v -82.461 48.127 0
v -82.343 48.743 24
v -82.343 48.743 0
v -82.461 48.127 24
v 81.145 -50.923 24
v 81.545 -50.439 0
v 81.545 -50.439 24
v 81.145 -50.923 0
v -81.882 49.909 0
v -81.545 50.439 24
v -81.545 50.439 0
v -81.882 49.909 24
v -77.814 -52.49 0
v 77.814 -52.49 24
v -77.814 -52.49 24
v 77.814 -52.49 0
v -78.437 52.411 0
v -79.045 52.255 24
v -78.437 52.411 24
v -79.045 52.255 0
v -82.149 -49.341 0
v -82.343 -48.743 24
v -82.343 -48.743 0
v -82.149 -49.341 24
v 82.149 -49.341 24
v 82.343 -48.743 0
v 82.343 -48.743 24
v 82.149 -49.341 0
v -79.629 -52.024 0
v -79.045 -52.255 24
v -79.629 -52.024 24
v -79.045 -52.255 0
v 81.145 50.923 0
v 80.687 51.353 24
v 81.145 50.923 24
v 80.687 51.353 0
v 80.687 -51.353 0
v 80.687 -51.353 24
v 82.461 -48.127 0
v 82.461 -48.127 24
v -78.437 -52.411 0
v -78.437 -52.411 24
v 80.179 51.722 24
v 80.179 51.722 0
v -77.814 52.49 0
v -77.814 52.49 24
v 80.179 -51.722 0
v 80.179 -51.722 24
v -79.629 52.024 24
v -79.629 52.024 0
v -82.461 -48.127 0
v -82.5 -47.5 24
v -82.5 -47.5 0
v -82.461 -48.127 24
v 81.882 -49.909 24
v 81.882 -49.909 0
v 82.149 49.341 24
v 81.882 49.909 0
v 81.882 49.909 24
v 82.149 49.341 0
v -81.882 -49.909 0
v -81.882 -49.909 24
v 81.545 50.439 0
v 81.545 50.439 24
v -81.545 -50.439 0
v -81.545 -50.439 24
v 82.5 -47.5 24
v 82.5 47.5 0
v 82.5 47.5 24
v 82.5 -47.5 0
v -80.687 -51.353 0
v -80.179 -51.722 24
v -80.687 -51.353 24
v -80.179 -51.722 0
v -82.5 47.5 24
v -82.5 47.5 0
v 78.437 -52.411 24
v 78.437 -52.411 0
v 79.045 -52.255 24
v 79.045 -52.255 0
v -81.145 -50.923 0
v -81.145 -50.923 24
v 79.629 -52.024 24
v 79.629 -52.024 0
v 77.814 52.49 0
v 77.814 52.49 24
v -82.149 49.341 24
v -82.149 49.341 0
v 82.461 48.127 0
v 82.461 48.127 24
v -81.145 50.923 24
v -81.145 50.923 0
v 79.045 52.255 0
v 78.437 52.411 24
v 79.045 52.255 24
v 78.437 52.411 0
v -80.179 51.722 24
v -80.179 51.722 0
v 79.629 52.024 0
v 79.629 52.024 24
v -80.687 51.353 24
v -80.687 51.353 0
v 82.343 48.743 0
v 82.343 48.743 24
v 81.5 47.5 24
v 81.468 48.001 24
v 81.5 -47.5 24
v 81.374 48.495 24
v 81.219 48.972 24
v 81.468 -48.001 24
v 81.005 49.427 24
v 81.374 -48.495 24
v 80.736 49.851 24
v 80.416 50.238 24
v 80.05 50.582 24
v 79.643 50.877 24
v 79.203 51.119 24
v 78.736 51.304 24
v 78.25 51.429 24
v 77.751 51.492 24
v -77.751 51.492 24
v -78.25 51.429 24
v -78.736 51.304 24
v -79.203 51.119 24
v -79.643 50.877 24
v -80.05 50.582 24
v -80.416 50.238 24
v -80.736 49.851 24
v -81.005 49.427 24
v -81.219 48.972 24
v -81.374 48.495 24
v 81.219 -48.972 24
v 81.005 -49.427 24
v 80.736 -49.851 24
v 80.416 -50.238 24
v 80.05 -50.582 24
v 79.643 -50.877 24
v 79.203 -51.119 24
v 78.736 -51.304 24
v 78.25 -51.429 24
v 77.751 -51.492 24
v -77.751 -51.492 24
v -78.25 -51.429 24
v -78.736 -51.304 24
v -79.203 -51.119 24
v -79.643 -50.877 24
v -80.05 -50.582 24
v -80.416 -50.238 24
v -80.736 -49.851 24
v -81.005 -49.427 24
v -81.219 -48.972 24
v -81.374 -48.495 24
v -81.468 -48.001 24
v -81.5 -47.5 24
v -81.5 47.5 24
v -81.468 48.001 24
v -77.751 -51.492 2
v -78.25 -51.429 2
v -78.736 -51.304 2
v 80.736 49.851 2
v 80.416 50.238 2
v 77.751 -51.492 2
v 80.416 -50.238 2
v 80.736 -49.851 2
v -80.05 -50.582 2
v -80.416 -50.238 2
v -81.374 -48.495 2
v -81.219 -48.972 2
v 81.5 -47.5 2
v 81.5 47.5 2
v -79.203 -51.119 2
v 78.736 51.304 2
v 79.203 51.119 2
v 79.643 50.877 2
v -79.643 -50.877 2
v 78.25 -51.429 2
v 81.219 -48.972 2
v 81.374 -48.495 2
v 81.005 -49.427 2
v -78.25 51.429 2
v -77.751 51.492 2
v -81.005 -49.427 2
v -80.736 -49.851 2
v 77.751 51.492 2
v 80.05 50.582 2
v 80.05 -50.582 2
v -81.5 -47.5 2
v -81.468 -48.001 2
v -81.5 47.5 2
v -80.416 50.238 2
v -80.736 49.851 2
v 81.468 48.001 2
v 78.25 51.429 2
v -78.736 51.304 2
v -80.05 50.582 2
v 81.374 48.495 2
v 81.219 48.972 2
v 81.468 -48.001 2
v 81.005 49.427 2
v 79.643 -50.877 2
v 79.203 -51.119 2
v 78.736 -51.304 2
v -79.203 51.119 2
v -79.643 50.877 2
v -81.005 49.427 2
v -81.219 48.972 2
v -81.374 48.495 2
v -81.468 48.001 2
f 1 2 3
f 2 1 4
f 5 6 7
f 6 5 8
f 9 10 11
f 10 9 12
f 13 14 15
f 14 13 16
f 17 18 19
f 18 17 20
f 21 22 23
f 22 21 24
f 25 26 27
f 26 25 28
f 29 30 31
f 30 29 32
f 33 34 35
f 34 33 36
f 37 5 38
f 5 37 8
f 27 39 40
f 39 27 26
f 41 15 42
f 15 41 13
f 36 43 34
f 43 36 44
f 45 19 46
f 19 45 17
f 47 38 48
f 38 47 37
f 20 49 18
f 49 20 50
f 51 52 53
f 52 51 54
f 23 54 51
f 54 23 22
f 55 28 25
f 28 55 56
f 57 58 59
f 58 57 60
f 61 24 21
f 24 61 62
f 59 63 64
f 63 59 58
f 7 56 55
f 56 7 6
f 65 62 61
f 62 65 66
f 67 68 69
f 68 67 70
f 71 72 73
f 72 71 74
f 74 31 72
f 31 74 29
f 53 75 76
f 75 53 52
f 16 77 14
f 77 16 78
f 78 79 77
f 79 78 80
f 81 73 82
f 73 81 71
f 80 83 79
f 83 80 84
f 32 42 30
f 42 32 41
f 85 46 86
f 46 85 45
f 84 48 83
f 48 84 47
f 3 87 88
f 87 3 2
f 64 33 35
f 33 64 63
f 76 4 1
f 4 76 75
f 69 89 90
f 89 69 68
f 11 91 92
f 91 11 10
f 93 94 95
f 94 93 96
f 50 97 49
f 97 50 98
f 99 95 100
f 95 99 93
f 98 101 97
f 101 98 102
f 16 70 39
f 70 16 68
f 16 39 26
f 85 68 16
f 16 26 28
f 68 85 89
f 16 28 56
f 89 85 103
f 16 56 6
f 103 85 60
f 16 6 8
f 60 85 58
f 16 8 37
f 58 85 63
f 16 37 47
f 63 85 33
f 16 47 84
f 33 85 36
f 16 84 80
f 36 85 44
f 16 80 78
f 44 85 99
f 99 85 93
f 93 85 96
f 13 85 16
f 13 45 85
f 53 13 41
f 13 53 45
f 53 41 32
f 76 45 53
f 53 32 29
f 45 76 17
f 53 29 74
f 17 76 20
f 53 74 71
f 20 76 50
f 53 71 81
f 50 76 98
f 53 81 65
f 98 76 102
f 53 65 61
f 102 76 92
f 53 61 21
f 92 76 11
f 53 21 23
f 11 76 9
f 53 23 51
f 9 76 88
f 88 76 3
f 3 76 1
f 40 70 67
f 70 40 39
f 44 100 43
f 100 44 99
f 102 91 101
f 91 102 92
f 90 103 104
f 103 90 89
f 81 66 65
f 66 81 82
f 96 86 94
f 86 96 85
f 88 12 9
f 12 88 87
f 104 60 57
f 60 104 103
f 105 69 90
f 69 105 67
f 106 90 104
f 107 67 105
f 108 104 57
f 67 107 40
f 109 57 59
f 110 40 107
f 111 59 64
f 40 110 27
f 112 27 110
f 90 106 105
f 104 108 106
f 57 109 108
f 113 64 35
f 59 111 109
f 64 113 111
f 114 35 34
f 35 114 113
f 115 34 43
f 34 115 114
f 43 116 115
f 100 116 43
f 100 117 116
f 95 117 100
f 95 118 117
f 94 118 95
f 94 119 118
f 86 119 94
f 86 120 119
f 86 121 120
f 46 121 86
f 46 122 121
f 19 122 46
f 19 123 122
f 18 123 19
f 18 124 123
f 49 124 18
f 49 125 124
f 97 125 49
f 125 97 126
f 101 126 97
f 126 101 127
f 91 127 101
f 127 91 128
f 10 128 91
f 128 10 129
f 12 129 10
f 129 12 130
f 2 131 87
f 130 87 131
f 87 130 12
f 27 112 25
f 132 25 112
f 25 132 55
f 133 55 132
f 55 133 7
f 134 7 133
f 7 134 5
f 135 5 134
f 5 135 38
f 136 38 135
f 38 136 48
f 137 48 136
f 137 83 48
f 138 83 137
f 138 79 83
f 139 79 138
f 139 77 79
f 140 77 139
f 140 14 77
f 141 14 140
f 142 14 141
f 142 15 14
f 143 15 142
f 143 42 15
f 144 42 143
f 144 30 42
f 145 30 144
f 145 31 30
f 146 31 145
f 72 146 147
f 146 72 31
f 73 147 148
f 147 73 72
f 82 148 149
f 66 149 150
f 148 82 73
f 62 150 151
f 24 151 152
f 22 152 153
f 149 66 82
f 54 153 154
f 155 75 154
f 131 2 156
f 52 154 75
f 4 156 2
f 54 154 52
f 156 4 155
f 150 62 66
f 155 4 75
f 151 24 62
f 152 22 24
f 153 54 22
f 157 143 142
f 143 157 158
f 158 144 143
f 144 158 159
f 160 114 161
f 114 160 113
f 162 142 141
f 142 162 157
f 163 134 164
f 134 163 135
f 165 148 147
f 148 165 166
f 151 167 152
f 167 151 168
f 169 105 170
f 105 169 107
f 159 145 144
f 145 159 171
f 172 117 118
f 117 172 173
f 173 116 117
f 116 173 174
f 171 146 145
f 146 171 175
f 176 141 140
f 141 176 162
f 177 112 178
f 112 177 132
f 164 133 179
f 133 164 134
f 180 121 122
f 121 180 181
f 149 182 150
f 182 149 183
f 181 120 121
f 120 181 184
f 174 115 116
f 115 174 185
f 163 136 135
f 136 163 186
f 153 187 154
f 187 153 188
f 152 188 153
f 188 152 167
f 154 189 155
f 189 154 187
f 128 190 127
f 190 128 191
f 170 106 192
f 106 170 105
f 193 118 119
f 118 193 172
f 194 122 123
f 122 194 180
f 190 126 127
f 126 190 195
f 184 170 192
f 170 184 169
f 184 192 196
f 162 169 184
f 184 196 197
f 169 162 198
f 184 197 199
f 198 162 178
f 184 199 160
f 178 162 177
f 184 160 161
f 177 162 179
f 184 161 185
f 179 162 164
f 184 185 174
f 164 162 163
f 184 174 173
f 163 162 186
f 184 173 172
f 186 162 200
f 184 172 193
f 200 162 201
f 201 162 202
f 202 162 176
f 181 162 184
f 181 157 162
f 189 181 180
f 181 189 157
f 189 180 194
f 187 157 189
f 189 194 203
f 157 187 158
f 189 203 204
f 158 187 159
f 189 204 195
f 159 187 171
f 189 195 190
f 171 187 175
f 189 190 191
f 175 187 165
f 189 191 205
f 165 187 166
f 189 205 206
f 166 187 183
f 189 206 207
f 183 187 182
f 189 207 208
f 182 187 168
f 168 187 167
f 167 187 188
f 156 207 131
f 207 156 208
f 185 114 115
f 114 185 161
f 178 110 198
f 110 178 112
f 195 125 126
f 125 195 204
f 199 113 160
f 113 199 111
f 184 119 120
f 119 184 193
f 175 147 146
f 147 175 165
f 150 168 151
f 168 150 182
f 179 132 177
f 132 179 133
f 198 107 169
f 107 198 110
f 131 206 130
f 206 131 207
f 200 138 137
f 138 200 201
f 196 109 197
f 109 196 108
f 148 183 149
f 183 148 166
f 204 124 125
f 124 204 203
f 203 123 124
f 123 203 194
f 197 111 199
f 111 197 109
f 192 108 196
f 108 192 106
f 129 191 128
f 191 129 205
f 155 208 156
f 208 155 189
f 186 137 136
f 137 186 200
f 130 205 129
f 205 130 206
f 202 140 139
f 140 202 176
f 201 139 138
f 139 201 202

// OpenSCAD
$fn = 50;


difference() {
	union() {
		hull() {
			translate(v = [-77.5000000000, 47.5000000000, 0]) {
				cylinder(h = 24, r = 5);
			}
			translate(v = [77.5000000000, 47.5000000000, 0]) {
				cylinder(h = 24, r = 5);
			}
			translate(v = [-77.5000000000, -47.5000000000, 0]) {
				cylinder(h = 24, r = 5);
			}
			translate(v = [77.5000000000, -47.5000000000, 0]) {
				cylinder(h = 24, r = 5);
			}
		}
	}
	union() {
		translate(v = [0, 0, 2]) {
			hull() {
				translate(v = [-77.5000000000, 47.5000000000, 0]) {
					cylinder(h = 22, r = 4);
				}
				translate(v = [77.5000000000, 47.5000000000, 0]) {
					cylinder(h = 22, r = 4);
				}
				translate(v = [-77.5000000000, -47.5000000000, 0]) {
					cylinder(h = 22, r = 4);
				}
				translate(v = [77.5000000000, -47.5000000000, 0]) {
					cylinder(h = 22, r = 4);
				}
			}
		}
	}
}
